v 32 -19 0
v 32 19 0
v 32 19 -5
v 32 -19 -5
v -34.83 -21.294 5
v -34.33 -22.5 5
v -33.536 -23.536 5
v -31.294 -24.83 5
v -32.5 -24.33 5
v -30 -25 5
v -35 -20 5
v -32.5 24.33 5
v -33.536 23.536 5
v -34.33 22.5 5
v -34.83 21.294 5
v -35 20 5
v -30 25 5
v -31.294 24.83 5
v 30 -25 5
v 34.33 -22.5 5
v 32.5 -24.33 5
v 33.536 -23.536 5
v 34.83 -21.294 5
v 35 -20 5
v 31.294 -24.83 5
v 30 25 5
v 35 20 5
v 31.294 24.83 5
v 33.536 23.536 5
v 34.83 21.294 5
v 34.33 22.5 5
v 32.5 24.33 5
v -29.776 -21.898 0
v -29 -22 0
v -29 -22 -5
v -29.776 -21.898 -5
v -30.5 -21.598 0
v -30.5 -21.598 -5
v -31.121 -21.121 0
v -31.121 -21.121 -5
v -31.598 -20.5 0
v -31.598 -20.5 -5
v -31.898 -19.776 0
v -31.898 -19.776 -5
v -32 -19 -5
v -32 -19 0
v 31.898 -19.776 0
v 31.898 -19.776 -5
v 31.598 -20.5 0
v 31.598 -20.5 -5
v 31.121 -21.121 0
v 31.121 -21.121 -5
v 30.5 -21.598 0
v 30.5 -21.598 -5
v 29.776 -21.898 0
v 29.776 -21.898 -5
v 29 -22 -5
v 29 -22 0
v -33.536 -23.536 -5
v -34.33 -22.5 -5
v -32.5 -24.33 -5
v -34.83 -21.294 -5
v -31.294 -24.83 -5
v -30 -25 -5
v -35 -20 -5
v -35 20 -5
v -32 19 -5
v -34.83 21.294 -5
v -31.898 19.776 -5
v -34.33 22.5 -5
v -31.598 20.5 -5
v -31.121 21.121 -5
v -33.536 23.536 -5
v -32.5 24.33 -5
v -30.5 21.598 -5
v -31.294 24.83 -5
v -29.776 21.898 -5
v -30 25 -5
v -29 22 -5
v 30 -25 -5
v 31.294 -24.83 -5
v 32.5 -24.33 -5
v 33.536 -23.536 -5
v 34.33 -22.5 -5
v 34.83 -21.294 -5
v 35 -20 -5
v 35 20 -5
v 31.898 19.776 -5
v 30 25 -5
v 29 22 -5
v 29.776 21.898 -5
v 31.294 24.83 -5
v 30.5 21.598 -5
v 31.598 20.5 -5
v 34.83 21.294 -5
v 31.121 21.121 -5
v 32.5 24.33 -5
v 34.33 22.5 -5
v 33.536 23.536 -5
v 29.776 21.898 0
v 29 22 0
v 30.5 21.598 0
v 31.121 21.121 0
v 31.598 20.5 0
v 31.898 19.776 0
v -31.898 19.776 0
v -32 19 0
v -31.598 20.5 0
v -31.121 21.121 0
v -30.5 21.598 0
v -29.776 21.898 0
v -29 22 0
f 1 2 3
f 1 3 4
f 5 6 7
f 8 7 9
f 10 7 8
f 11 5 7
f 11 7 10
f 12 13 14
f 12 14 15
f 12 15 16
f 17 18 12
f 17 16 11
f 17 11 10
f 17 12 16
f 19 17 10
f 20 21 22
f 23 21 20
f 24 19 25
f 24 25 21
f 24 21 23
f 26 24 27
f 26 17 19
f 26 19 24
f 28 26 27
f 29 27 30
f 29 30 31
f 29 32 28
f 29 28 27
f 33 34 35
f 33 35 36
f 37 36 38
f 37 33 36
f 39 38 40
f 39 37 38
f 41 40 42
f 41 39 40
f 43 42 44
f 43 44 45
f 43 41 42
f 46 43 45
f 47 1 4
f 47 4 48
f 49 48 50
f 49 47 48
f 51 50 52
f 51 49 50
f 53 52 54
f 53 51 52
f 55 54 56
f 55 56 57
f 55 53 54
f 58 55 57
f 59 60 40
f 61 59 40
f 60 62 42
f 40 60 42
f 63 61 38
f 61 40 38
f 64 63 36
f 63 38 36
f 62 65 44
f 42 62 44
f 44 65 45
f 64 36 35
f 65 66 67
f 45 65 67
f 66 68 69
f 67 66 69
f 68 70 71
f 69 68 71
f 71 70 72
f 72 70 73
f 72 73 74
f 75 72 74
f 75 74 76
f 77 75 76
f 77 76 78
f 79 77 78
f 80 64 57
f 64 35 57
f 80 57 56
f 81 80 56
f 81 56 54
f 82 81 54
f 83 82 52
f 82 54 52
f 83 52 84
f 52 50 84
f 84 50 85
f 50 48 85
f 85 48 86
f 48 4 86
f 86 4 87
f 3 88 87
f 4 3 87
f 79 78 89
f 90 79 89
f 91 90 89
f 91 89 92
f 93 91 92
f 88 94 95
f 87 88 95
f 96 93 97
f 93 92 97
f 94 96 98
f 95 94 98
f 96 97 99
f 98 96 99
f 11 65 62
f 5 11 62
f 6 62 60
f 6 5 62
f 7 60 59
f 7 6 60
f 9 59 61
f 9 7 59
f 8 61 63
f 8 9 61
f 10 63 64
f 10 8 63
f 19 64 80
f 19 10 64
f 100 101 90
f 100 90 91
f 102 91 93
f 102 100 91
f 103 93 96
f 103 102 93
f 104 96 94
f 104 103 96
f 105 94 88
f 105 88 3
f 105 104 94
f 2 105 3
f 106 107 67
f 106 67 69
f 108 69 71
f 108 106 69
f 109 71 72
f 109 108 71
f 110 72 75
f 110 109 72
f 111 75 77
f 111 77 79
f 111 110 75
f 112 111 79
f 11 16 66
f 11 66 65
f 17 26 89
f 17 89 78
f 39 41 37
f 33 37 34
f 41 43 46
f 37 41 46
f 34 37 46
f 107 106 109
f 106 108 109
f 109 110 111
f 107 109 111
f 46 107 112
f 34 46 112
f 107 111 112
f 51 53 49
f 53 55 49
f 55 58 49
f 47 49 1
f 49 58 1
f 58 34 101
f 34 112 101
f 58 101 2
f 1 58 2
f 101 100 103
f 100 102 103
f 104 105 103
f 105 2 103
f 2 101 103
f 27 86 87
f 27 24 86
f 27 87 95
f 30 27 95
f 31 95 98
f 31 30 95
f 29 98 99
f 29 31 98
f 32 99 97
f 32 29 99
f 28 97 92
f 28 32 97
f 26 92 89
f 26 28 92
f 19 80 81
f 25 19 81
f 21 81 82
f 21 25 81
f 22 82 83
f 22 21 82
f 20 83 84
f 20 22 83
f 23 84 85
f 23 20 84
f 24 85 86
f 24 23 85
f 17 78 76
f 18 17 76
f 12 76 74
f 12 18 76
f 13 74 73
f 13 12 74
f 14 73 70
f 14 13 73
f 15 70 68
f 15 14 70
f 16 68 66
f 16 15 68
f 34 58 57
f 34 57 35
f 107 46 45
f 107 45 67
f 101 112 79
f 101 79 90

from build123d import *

# Parameters (mm, degrees)
F1_DEPTH = 5
F2_DEPTH = 5


with BuildPart() as f1:
    # F0 (on Top) → F1 (new body)
    with BuildSketch(Plane.XY):
        with BuildLine():
            ThreePointArc((35, 20), (33.535534, 23.535534), (30, 25))
            Line((30, 25), (-30, 25))
            ThreePointArc((-30, 25), (-33.535534, 23.535534), (-35, 20))
            Line((-35, 20), (-35, -20))
            ThreePointArc((-35, -20), (-33.535534, -23.535534), (-30, -25))
            Line((-30, -25), (30, -25))
            ThreePointArc((30, -25), (33.535534, -23.535534), (35, -20))
            Line((35, -20), (35, 20))
        make_face()
        with BuildLine():
            Line((-32, -19), (-32, 19))
            ThreePointArc((-32, 19), (-31.12132, 21.12132), (-29, 22))
            Line((-29, 22), (29, 22))
            ThreePointArc((29, 22), (31.12132, 21.12132), (32, 19))
            Line((32, 19), (32, -19))
            ThreePointArc((32, -19), (31.12132, -21.12132), (29, -22))
            Line((29, -22), (-29, -22))
            ThreePointArc((-29, -22), (-31.12132, -21.12132), (-32, -19))
        make_face(mode=Mode.SUBTRACT)
        with BuildLine():
            ThreePointArc((-29, 22), (-31.12132, 21.12132), (-32, 19))
            Line((-32, 19), (-32, -19))
            ThreePointArc((-32, -19), (-31.12132, -21.12132), (-29, -22))
            Line((-29, -22), (29, -22))
            ThreePointArc((29, -22), (31.12132, -21.12132), (32, -19))
            Line((32, -19), (32, 19))
            ThreePointArc((32, 19), (31.12132, 21.12132), (29, 22))
            Line((29, 22), (-29, 22))
        make_face()
    extrude(amount=F1_DEPTH)

    # F0 (on Top) → F2 (join)
    with BuildSketch(Plane.XY):
        with BuildLine():
            ThreePointArc((35, 20), (33.535534, 23.535534), (30, 25))
            Line((30, 25), (-30, 25))
            ThreePointArc((-30, 25), (-33.535534, 23.535534), (-35, 20))
            Line((-35, 20), (-35, -20))
            ThreePointArc((-35, -20), (-33.535534, -23.535534), (-30, -25))
            Line((-30, -25), (30, -25))
            ThreePointArc((30, -25), (33.535534, -23.535534), (35, -20))
            Line((35, -20), (35, 20))
        make_face()
        with BuildLine():
            Line((-32, -19), (-32, 19))
            ThreePointArc((-32, 19), (-31.12132, 21.12132), (-29, 22))
            Line((-29, 22), (29, 22))
            ThreePointArc((29, 22), (31.12132, 21.12132), (32, 19))
            Line((32, 19), (32, -19))
            ThreePointArc((32, -19), (31.12132, -21.12132), (29, -22))
            Line((29, -22), (-29, -22))
            ThreePointArc((-29, -22), (-31.12132, -21.12132), (-32, -19))
        make_face(mode=Mode.SUBTRACT)
    extrude(amount=-F2_DEPTH)


solid = f1.part
